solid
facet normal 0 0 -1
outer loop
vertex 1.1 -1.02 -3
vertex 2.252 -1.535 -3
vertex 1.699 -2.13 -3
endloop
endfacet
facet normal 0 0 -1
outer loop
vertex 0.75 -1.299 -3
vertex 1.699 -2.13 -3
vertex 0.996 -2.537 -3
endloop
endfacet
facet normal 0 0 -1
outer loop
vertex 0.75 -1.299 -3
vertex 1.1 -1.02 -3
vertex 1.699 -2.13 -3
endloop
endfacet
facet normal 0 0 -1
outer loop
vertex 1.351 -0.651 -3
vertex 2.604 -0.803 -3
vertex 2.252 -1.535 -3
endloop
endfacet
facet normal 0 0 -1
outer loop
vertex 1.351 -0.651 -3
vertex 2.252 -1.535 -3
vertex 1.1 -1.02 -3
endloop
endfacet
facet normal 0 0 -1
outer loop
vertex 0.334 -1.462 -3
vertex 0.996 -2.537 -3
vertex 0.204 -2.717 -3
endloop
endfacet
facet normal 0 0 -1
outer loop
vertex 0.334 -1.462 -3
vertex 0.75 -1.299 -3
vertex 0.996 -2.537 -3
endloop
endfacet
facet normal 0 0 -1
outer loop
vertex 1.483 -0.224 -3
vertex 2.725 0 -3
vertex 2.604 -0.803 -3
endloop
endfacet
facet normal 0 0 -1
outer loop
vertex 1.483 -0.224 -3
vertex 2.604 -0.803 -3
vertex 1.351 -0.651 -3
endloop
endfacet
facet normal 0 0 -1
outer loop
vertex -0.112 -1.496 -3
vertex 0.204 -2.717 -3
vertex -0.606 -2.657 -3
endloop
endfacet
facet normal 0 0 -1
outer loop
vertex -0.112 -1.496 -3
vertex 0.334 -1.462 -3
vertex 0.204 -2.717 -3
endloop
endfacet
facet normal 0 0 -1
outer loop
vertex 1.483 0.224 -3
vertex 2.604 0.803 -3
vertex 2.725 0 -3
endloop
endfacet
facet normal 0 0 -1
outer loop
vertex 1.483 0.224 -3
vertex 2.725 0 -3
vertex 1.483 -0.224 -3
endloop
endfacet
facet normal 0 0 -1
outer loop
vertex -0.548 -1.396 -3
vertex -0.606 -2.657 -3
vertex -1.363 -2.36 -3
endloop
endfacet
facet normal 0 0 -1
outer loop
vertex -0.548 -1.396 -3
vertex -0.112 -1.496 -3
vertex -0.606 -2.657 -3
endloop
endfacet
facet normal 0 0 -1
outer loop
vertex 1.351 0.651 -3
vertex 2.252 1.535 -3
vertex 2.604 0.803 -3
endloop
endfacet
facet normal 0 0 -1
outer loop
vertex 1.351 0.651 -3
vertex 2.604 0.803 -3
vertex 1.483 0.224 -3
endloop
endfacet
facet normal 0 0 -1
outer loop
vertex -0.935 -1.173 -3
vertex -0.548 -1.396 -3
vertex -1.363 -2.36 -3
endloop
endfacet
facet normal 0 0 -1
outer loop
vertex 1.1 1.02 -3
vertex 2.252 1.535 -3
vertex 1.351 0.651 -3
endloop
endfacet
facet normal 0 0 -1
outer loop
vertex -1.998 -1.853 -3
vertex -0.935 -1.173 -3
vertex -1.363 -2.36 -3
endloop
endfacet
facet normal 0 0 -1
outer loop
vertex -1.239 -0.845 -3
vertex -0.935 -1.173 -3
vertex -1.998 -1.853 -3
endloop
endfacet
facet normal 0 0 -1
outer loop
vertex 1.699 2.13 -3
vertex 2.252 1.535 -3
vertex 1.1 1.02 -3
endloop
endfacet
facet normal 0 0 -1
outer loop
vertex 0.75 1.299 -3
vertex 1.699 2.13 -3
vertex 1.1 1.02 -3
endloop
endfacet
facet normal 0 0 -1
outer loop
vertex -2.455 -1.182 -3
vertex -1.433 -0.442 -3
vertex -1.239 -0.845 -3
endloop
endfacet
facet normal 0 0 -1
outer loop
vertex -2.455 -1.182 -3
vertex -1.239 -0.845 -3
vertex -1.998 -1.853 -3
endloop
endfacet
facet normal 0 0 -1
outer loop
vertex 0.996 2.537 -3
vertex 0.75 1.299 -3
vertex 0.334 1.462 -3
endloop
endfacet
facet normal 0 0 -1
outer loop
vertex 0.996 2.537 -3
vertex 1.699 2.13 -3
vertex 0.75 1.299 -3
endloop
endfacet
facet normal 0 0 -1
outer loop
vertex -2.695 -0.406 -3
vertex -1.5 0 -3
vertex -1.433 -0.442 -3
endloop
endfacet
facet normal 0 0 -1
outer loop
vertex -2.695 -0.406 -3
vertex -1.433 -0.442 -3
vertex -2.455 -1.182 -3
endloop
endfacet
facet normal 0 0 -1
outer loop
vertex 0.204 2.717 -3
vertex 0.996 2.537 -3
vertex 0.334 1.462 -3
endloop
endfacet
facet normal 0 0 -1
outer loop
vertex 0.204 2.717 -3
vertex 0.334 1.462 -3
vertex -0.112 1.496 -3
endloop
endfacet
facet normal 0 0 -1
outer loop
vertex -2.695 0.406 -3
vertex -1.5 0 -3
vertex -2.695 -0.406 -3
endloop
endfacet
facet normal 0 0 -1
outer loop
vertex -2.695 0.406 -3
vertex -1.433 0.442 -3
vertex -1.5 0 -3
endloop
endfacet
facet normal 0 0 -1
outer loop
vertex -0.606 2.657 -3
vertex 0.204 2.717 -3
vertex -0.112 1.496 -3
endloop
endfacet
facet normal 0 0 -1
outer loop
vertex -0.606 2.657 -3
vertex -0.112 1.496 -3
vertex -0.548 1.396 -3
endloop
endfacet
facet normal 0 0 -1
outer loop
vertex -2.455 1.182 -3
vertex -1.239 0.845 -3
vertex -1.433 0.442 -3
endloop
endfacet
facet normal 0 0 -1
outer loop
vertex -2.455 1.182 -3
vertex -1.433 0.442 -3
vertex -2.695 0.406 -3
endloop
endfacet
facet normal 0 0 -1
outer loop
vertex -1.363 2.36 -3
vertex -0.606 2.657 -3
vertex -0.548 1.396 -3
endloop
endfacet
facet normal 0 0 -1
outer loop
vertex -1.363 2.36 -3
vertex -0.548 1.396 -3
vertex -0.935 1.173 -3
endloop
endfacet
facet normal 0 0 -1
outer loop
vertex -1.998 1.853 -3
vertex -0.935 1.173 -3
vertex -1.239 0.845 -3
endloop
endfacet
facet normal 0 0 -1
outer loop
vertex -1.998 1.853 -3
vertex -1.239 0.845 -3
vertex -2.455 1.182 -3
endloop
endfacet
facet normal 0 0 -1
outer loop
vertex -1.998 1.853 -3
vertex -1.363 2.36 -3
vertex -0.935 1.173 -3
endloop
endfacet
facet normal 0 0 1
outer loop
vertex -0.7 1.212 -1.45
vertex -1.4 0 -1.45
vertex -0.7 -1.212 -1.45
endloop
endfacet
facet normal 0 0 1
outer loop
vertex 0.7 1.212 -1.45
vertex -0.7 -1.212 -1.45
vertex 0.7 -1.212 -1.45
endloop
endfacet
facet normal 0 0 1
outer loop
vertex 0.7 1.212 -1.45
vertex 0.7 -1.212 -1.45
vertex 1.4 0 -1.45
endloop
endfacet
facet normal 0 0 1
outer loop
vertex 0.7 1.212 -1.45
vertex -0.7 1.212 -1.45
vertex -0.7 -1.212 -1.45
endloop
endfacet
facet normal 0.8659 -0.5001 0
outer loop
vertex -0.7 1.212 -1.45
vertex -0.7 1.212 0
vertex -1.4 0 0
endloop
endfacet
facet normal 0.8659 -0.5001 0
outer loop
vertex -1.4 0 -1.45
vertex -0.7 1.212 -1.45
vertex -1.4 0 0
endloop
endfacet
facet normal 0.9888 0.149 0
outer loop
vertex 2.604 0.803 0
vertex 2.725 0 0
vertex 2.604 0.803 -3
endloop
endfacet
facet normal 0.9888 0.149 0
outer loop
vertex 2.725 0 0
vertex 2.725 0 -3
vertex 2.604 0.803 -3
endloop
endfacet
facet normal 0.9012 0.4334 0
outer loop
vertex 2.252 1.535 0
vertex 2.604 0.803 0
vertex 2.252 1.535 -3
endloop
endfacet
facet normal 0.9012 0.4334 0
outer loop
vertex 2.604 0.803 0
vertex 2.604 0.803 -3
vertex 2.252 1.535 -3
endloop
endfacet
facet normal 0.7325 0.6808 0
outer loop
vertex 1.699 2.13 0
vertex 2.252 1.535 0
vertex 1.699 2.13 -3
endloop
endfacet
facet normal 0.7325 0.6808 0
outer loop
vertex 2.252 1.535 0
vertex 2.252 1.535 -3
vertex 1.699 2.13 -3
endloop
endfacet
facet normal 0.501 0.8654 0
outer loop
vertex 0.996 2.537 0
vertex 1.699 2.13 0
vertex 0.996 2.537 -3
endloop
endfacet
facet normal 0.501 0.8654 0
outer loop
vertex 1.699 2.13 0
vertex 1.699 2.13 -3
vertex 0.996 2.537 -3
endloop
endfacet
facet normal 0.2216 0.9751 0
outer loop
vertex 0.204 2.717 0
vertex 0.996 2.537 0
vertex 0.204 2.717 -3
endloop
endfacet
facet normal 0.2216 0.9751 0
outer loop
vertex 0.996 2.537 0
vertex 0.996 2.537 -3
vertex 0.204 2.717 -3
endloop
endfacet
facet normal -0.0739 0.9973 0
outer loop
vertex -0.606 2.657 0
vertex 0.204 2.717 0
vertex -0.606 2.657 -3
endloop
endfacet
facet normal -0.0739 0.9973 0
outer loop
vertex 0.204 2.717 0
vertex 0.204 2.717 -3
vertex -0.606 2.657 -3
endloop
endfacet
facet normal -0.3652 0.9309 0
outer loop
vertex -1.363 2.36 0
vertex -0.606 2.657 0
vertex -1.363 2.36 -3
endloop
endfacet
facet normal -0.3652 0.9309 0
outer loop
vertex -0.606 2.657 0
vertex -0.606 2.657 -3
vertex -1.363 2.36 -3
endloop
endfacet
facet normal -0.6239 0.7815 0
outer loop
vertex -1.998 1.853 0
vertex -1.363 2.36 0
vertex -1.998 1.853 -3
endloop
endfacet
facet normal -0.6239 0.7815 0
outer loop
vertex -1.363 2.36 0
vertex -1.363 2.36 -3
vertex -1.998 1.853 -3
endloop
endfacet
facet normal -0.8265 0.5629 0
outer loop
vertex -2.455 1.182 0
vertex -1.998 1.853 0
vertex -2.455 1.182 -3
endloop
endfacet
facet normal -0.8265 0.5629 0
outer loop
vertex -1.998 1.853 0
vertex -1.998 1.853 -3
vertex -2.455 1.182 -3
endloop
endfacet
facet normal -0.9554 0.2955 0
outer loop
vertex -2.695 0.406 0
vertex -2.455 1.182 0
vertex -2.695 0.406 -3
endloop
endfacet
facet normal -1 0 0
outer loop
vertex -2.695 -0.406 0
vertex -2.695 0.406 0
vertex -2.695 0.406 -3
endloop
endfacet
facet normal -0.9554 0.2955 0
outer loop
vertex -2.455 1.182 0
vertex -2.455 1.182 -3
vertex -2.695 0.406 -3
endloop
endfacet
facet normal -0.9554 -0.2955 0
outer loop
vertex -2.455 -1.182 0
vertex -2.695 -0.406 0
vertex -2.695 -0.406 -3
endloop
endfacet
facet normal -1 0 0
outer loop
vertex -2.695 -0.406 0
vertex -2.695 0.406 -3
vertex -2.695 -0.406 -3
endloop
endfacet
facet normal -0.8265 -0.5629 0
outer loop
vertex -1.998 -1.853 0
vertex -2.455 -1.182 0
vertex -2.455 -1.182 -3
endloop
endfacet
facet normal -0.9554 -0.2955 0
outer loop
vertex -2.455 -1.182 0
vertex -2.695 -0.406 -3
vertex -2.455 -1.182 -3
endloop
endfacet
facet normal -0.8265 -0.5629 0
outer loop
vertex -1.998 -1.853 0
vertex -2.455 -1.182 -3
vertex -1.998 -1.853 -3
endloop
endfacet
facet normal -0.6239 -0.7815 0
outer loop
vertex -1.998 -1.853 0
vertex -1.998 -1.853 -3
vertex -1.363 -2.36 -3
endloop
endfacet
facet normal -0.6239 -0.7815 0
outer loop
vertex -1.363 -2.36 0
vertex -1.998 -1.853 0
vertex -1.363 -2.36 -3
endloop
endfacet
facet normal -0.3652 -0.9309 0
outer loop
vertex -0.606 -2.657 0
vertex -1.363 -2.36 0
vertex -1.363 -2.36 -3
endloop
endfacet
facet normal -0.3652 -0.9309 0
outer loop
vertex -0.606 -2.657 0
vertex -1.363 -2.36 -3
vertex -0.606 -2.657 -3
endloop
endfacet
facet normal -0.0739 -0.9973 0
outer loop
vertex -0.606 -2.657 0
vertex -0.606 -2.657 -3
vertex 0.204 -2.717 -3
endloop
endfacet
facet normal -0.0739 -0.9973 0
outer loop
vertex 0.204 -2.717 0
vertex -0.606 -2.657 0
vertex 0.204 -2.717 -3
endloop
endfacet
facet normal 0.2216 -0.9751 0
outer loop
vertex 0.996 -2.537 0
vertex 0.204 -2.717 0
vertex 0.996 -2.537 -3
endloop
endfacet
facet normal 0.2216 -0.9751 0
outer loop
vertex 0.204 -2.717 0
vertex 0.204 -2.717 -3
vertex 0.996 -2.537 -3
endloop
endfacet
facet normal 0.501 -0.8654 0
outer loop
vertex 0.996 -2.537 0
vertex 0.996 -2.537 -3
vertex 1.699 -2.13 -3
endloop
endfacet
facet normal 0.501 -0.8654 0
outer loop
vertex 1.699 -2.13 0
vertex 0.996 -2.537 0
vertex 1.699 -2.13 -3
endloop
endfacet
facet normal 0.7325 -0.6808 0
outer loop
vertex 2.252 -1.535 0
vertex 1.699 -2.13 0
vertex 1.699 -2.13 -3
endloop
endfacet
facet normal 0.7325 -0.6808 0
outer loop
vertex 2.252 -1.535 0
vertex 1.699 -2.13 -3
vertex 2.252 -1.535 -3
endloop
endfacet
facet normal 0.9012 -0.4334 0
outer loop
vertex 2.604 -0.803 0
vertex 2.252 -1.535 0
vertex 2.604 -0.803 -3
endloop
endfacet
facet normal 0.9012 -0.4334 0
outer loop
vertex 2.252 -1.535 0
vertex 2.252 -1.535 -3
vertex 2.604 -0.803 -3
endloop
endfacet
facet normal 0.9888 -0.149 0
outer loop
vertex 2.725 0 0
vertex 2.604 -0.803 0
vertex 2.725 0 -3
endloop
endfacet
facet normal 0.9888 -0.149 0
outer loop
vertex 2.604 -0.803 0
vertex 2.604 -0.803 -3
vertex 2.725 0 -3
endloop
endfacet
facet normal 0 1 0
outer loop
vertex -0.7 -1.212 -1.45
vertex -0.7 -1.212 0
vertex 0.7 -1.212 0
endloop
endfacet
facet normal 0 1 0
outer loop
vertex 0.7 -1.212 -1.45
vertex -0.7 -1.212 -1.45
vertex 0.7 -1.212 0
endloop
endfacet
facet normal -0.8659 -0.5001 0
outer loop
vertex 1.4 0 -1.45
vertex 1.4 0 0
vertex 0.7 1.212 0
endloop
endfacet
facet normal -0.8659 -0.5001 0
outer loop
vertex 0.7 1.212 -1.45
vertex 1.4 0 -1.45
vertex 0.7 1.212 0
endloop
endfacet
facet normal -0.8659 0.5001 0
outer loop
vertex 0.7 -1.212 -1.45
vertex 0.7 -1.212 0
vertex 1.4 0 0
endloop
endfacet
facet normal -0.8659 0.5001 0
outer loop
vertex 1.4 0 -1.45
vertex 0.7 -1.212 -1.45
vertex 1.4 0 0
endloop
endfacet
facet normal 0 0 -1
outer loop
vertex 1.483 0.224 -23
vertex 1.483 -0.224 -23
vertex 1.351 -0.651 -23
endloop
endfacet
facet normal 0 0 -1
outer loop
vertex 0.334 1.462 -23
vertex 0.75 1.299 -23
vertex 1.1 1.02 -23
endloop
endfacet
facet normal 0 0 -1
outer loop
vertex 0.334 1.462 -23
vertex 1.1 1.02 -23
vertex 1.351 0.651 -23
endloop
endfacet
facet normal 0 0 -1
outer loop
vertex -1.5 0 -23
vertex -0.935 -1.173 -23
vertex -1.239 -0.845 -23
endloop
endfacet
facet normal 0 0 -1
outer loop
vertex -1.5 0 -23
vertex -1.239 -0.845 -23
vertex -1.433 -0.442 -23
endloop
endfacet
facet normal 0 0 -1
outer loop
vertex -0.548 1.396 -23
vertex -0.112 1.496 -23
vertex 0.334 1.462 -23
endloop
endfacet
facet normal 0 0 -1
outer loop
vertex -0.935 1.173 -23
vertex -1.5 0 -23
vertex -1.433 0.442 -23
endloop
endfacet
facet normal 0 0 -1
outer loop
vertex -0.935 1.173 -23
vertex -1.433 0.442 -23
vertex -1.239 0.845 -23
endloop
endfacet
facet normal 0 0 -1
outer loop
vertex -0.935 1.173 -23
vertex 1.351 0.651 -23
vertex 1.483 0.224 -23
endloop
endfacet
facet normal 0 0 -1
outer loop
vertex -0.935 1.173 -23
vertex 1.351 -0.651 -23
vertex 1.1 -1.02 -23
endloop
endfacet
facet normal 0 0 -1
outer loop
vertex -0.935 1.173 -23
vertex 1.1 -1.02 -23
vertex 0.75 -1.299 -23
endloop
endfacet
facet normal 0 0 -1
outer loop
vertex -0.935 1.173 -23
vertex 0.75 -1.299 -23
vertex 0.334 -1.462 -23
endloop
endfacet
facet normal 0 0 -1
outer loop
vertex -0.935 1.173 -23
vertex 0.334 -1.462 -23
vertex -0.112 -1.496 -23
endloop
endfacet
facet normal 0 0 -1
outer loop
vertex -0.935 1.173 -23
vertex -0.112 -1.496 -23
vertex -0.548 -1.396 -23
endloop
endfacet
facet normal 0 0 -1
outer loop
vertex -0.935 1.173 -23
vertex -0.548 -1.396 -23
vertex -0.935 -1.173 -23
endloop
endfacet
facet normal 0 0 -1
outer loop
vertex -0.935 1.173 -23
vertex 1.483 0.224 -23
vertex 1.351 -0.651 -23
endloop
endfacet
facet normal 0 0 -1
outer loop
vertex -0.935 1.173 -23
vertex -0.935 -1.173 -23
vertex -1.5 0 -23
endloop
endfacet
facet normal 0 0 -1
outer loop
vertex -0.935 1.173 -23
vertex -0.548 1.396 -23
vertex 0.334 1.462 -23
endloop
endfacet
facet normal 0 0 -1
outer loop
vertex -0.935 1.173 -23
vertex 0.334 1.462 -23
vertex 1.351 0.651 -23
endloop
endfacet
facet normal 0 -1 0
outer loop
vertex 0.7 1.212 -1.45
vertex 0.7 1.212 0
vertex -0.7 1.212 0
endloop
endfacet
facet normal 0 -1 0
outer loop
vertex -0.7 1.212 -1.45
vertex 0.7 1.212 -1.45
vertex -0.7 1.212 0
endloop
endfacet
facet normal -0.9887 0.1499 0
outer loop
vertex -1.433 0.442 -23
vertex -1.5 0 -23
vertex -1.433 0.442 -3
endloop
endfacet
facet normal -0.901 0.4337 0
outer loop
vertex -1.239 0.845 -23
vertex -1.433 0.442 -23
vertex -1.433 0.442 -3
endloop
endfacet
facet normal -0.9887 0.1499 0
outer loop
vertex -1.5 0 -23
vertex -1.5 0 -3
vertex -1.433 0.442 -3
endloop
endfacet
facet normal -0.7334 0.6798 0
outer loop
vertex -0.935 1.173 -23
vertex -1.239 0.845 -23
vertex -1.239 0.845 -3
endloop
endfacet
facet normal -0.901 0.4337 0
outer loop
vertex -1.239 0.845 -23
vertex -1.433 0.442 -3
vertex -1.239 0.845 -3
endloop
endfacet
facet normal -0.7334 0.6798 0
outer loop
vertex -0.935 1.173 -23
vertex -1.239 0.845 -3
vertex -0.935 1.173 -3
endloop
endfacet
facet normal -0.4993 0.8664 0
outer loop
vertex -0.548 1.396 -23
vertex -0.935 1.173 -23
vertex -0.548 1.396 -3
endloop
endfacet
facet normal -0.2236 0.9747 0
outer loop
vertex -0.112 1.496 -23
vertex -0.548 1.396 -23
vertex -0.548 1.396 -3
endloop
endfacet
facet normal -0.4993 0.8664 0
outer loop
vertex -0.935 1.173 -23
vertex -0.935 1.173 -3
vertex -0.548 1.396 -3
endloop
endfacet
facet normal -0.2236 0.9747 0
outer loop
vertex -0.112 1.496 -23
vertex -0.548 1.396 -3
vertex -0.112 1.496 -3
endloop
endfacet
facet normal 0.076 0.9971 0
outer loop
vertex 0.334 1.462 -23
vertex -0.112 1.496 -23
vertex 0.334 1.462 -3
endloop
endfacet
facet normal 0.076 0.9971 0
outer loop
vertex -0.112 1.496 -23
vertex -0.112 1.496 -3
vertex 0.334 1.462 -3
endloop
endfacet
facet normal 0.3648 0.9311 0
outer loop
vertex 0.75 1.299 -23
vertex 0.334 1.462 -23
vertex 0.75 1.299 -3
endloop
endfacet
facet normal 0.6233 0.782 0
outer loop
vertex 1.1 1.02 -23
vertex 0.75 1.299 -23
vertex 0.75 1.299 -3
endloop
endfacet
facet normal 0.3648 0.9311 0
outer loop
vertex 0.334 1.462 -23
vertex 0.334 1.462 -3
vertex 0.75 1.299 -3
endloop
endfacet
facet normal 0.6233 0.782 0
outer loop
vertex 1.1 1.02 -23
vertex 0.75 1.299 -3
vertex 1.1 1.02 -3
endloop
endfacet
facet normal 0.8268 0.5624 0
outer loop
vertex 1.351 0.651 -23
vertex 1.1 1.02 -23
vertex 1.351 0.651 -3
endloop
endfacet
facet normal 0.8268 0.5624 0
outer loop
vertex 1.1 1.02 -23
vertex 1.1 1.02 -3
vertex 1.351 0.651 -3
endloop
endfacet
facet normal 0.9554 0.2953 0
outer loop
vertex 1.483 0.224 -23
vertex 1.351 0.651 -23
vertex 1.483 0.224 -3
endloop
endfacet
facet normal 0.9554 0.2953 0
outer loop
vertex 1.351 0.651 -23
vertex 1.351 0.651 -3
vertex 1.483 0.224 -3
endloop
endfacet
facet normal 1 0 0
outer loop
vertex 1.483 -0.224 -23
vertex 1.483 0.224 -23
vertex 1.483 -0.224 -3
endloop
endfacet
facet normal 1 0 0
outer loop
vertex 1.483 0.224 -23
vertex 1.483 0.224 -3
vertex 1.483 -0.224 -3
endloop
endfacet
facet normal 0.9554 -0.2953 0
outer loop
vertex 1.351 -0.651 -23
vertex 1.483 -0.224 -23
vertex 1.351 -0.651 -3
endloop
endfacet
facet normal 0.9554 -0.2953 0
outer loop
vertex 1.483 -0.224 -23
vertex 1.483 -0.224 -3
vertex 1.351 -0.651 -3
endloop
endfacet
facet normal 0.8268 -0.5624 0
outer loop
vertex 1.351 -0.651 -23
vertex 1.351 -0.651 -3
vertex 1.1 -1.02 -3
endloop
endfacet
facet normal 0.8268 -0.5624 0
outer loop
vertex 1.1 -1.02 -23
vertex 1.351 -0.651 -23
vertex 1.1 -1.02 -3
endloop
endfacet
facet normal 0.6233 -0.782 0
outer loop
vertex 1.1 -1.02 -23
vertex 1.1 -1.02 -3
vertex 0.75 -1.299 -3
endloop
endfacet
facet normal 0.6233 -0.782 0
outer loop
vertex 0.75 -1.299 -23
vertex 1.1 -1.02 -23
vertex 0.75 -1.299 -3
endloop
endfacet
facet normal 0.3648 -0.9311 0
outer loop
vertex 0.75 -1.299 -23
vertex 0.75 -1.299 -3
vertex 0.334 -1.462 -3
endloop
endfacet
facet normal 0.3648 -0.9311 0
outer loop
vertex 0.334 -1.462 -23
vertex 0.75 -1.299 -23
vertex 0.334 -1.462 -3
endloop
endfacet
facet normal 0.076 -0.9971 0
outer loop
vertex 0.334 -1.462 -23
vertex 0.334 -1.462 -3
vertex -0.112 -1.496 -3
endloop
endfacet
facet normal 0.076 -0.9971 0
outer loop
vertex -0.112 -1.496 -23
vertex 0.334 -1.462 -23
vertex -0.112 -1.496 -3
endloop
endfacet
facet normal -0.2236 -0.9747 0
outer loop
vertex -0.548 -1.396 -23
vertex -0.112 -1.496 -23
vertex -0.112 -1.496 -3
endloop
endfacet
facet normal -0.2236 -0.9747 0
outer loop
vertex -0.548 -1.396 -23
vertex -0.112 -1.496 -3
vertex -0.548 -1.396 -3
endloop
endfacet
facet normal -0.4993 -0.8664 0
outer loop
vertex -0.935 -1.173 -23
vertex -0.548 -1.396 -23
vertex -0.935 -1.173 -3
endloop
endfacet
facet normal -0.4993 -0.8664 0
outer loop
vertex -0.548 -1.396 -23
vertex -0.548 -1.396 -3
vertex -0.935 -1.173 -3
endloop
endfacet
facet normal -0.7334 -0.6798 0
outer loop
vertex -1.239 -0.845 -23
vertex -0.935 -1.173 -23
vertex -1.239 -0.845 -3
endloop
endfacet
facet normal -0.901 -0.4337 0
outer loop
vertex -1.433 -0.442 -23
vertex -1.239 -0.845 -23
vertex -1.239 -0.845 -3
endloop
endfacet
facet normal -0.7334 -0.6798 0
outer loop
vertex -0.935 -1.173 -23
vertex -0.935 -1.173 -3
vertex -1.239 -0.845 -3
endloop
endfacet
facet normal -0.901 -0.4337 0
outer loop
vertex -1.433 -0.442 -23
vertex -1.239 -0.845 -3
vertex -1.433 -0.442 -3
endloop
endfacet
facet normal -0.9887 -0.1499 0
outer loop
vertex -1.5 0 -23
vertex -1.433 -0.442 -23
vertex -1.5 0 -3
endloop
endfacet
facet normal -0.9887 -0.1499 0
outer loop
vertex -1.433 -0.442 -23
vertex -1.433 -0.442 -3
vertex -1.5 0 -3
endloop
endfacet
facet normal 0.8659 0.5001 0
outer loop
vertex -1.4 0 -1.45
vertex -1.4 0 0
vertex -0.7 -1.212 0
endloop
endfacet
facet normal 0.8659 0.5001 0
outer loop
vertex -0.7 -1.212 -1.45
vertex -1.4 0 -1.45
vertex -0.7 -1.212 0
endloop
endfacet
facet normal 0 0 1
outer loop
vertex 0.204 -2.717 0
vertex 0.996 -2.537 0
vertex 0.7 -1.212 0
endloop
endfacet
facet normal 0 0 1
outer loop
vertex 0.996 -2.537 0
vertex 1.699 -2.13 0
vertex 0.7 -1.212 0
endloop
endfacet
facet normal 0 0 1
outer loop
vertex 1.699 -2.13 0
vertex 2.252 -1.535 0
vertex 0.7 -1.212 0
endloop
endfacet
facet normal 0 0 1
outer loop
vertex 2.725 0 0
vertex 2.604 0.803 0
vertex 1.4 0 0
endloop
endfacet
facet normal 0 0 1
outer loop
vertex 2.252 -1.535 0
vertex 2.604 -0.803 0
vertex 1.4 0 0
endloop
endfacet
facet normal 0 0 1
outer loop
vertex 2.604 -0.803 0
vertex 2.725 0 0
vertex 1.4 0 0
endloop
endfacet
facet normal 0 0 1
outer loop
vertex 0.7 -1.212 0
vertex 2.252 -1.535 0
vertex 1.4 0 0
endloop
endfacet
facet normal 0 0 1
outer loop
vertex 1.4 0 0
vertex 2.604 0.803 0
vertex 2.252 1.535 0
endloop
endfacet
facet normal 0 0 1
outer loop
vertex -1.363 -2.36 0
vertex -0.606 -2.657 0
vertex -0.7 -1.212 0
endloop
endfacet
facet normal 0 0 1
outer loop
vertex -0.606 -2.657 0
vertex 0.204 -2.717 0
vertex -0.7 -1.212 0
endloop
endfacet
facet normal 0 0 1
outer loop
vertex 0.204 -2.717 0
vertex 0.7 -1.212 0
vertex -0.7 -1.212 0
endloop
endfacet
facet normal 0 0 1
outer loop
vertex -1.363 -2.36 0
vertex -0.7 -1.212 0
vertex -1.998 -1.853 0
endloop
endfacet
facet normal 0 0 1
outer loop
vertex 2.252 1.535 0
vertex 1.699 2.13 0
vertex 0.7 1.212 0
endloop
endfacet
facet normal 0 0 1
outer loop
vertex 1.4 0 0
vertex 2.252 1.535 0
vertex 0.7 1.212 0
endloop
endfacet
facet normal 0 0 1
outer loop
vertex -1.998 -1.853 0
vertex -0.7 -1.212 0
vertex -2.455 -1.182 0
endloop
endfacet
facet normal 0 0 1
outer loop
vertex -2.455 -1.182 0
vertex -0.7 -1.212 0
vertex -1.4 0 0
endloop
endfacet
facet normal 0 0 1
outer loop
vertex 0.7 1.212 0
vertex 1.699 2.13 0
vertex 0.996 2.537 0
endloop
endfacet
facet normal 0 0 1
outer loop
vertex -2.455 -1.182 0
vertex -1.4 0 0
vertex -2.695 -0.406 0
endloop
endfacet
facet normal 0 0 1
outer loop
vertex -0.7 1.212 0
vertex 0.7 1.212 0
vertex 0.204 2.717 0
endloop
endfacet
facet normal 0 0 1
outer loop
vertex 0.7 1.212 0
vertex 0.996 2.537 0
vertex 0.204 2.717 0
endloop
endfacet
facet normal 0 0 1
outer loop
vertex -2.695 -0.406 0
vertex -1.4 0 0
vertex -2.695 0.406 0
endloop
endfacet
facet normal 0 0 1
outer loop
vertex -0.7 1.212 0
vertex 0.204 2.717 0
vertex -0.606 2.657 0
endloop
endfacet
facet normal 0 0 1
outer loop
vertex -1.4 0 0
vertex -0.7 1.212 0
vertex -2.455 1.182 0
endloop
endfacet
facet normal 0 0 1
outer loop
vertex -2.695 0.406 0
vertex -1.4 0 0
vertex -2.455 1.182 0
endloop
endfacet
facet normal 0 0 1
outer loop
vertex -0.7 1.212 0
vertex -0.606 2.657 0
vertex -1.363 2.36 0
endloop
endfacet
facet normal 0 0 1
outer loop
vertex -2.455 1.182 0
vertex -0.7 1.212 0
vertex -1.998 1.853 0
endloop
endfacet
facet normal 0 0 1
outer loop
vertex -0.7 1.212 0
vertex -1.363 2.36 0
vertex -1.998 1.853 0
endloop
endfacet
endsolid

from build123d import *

# Parameters (mm, degrees)
SKETCH1_W           = 2.725
SKETCH1_H           = 3
SKETCH2_R           = 1.5
BOSS_EXTRUDE1_DEPTH = 3
SKETCH3_R           = 1.5
BOSS_EXTRUDE2_DEPTH = 17
CUT_EXTRUDE1_DEPTH  = 1.45


with BuildPart() as part:
    # Sketch1 → Revolve1 (revolve)
    with BuildSketch(Plane(origin=(0, 0, 0), x_dir=(1, 0, 0), z_dir=(0, 1, 0))):
        with Locations((1.3625, 1.5)):
            Rectangle(SKETCH1_W, SKETCH1_H)
    revolve(axis=Axis((0, 0, -3), (0, 0, 1)))

    # Sketch2 → Boss-Extrude1 (add)
    with BuildSketch(Plane(origin=(0, 0, -3), x_dir=(-1, 0, 0), z_dir=(0, 0, -1))):
        Circle(SKETCH2_R)
    extrude(amount=BOSS_EXTRUDE1_DEPTH)

    # Sketch3 → Boss-Extrude2 (add)
    with BuildSketch(Plane(origin=(0, 0, -6), x_dir=(-1, 0, 0), z_dir=(0, 0, -1))):
        Circle(SKETCH3_R)
    extrude(amount=BOSS_EXTRUDE2_DEPTH)

    # Sketch4 → Cut-Extrude1 (cut)
    with BuildSketch(Plane.XY):
        Polygon((-1.4, 0), (-0.7, -1.212435565), (0.7, -1.212435565), (1.4, 0), (0.7, 1.212435565), (-0.7, 1.212435565), align=None)
    extrude(amount=-CUT_EXTRUDE1_DEPTH, mode=Mode.SUBTRACT)


solid = part.part
